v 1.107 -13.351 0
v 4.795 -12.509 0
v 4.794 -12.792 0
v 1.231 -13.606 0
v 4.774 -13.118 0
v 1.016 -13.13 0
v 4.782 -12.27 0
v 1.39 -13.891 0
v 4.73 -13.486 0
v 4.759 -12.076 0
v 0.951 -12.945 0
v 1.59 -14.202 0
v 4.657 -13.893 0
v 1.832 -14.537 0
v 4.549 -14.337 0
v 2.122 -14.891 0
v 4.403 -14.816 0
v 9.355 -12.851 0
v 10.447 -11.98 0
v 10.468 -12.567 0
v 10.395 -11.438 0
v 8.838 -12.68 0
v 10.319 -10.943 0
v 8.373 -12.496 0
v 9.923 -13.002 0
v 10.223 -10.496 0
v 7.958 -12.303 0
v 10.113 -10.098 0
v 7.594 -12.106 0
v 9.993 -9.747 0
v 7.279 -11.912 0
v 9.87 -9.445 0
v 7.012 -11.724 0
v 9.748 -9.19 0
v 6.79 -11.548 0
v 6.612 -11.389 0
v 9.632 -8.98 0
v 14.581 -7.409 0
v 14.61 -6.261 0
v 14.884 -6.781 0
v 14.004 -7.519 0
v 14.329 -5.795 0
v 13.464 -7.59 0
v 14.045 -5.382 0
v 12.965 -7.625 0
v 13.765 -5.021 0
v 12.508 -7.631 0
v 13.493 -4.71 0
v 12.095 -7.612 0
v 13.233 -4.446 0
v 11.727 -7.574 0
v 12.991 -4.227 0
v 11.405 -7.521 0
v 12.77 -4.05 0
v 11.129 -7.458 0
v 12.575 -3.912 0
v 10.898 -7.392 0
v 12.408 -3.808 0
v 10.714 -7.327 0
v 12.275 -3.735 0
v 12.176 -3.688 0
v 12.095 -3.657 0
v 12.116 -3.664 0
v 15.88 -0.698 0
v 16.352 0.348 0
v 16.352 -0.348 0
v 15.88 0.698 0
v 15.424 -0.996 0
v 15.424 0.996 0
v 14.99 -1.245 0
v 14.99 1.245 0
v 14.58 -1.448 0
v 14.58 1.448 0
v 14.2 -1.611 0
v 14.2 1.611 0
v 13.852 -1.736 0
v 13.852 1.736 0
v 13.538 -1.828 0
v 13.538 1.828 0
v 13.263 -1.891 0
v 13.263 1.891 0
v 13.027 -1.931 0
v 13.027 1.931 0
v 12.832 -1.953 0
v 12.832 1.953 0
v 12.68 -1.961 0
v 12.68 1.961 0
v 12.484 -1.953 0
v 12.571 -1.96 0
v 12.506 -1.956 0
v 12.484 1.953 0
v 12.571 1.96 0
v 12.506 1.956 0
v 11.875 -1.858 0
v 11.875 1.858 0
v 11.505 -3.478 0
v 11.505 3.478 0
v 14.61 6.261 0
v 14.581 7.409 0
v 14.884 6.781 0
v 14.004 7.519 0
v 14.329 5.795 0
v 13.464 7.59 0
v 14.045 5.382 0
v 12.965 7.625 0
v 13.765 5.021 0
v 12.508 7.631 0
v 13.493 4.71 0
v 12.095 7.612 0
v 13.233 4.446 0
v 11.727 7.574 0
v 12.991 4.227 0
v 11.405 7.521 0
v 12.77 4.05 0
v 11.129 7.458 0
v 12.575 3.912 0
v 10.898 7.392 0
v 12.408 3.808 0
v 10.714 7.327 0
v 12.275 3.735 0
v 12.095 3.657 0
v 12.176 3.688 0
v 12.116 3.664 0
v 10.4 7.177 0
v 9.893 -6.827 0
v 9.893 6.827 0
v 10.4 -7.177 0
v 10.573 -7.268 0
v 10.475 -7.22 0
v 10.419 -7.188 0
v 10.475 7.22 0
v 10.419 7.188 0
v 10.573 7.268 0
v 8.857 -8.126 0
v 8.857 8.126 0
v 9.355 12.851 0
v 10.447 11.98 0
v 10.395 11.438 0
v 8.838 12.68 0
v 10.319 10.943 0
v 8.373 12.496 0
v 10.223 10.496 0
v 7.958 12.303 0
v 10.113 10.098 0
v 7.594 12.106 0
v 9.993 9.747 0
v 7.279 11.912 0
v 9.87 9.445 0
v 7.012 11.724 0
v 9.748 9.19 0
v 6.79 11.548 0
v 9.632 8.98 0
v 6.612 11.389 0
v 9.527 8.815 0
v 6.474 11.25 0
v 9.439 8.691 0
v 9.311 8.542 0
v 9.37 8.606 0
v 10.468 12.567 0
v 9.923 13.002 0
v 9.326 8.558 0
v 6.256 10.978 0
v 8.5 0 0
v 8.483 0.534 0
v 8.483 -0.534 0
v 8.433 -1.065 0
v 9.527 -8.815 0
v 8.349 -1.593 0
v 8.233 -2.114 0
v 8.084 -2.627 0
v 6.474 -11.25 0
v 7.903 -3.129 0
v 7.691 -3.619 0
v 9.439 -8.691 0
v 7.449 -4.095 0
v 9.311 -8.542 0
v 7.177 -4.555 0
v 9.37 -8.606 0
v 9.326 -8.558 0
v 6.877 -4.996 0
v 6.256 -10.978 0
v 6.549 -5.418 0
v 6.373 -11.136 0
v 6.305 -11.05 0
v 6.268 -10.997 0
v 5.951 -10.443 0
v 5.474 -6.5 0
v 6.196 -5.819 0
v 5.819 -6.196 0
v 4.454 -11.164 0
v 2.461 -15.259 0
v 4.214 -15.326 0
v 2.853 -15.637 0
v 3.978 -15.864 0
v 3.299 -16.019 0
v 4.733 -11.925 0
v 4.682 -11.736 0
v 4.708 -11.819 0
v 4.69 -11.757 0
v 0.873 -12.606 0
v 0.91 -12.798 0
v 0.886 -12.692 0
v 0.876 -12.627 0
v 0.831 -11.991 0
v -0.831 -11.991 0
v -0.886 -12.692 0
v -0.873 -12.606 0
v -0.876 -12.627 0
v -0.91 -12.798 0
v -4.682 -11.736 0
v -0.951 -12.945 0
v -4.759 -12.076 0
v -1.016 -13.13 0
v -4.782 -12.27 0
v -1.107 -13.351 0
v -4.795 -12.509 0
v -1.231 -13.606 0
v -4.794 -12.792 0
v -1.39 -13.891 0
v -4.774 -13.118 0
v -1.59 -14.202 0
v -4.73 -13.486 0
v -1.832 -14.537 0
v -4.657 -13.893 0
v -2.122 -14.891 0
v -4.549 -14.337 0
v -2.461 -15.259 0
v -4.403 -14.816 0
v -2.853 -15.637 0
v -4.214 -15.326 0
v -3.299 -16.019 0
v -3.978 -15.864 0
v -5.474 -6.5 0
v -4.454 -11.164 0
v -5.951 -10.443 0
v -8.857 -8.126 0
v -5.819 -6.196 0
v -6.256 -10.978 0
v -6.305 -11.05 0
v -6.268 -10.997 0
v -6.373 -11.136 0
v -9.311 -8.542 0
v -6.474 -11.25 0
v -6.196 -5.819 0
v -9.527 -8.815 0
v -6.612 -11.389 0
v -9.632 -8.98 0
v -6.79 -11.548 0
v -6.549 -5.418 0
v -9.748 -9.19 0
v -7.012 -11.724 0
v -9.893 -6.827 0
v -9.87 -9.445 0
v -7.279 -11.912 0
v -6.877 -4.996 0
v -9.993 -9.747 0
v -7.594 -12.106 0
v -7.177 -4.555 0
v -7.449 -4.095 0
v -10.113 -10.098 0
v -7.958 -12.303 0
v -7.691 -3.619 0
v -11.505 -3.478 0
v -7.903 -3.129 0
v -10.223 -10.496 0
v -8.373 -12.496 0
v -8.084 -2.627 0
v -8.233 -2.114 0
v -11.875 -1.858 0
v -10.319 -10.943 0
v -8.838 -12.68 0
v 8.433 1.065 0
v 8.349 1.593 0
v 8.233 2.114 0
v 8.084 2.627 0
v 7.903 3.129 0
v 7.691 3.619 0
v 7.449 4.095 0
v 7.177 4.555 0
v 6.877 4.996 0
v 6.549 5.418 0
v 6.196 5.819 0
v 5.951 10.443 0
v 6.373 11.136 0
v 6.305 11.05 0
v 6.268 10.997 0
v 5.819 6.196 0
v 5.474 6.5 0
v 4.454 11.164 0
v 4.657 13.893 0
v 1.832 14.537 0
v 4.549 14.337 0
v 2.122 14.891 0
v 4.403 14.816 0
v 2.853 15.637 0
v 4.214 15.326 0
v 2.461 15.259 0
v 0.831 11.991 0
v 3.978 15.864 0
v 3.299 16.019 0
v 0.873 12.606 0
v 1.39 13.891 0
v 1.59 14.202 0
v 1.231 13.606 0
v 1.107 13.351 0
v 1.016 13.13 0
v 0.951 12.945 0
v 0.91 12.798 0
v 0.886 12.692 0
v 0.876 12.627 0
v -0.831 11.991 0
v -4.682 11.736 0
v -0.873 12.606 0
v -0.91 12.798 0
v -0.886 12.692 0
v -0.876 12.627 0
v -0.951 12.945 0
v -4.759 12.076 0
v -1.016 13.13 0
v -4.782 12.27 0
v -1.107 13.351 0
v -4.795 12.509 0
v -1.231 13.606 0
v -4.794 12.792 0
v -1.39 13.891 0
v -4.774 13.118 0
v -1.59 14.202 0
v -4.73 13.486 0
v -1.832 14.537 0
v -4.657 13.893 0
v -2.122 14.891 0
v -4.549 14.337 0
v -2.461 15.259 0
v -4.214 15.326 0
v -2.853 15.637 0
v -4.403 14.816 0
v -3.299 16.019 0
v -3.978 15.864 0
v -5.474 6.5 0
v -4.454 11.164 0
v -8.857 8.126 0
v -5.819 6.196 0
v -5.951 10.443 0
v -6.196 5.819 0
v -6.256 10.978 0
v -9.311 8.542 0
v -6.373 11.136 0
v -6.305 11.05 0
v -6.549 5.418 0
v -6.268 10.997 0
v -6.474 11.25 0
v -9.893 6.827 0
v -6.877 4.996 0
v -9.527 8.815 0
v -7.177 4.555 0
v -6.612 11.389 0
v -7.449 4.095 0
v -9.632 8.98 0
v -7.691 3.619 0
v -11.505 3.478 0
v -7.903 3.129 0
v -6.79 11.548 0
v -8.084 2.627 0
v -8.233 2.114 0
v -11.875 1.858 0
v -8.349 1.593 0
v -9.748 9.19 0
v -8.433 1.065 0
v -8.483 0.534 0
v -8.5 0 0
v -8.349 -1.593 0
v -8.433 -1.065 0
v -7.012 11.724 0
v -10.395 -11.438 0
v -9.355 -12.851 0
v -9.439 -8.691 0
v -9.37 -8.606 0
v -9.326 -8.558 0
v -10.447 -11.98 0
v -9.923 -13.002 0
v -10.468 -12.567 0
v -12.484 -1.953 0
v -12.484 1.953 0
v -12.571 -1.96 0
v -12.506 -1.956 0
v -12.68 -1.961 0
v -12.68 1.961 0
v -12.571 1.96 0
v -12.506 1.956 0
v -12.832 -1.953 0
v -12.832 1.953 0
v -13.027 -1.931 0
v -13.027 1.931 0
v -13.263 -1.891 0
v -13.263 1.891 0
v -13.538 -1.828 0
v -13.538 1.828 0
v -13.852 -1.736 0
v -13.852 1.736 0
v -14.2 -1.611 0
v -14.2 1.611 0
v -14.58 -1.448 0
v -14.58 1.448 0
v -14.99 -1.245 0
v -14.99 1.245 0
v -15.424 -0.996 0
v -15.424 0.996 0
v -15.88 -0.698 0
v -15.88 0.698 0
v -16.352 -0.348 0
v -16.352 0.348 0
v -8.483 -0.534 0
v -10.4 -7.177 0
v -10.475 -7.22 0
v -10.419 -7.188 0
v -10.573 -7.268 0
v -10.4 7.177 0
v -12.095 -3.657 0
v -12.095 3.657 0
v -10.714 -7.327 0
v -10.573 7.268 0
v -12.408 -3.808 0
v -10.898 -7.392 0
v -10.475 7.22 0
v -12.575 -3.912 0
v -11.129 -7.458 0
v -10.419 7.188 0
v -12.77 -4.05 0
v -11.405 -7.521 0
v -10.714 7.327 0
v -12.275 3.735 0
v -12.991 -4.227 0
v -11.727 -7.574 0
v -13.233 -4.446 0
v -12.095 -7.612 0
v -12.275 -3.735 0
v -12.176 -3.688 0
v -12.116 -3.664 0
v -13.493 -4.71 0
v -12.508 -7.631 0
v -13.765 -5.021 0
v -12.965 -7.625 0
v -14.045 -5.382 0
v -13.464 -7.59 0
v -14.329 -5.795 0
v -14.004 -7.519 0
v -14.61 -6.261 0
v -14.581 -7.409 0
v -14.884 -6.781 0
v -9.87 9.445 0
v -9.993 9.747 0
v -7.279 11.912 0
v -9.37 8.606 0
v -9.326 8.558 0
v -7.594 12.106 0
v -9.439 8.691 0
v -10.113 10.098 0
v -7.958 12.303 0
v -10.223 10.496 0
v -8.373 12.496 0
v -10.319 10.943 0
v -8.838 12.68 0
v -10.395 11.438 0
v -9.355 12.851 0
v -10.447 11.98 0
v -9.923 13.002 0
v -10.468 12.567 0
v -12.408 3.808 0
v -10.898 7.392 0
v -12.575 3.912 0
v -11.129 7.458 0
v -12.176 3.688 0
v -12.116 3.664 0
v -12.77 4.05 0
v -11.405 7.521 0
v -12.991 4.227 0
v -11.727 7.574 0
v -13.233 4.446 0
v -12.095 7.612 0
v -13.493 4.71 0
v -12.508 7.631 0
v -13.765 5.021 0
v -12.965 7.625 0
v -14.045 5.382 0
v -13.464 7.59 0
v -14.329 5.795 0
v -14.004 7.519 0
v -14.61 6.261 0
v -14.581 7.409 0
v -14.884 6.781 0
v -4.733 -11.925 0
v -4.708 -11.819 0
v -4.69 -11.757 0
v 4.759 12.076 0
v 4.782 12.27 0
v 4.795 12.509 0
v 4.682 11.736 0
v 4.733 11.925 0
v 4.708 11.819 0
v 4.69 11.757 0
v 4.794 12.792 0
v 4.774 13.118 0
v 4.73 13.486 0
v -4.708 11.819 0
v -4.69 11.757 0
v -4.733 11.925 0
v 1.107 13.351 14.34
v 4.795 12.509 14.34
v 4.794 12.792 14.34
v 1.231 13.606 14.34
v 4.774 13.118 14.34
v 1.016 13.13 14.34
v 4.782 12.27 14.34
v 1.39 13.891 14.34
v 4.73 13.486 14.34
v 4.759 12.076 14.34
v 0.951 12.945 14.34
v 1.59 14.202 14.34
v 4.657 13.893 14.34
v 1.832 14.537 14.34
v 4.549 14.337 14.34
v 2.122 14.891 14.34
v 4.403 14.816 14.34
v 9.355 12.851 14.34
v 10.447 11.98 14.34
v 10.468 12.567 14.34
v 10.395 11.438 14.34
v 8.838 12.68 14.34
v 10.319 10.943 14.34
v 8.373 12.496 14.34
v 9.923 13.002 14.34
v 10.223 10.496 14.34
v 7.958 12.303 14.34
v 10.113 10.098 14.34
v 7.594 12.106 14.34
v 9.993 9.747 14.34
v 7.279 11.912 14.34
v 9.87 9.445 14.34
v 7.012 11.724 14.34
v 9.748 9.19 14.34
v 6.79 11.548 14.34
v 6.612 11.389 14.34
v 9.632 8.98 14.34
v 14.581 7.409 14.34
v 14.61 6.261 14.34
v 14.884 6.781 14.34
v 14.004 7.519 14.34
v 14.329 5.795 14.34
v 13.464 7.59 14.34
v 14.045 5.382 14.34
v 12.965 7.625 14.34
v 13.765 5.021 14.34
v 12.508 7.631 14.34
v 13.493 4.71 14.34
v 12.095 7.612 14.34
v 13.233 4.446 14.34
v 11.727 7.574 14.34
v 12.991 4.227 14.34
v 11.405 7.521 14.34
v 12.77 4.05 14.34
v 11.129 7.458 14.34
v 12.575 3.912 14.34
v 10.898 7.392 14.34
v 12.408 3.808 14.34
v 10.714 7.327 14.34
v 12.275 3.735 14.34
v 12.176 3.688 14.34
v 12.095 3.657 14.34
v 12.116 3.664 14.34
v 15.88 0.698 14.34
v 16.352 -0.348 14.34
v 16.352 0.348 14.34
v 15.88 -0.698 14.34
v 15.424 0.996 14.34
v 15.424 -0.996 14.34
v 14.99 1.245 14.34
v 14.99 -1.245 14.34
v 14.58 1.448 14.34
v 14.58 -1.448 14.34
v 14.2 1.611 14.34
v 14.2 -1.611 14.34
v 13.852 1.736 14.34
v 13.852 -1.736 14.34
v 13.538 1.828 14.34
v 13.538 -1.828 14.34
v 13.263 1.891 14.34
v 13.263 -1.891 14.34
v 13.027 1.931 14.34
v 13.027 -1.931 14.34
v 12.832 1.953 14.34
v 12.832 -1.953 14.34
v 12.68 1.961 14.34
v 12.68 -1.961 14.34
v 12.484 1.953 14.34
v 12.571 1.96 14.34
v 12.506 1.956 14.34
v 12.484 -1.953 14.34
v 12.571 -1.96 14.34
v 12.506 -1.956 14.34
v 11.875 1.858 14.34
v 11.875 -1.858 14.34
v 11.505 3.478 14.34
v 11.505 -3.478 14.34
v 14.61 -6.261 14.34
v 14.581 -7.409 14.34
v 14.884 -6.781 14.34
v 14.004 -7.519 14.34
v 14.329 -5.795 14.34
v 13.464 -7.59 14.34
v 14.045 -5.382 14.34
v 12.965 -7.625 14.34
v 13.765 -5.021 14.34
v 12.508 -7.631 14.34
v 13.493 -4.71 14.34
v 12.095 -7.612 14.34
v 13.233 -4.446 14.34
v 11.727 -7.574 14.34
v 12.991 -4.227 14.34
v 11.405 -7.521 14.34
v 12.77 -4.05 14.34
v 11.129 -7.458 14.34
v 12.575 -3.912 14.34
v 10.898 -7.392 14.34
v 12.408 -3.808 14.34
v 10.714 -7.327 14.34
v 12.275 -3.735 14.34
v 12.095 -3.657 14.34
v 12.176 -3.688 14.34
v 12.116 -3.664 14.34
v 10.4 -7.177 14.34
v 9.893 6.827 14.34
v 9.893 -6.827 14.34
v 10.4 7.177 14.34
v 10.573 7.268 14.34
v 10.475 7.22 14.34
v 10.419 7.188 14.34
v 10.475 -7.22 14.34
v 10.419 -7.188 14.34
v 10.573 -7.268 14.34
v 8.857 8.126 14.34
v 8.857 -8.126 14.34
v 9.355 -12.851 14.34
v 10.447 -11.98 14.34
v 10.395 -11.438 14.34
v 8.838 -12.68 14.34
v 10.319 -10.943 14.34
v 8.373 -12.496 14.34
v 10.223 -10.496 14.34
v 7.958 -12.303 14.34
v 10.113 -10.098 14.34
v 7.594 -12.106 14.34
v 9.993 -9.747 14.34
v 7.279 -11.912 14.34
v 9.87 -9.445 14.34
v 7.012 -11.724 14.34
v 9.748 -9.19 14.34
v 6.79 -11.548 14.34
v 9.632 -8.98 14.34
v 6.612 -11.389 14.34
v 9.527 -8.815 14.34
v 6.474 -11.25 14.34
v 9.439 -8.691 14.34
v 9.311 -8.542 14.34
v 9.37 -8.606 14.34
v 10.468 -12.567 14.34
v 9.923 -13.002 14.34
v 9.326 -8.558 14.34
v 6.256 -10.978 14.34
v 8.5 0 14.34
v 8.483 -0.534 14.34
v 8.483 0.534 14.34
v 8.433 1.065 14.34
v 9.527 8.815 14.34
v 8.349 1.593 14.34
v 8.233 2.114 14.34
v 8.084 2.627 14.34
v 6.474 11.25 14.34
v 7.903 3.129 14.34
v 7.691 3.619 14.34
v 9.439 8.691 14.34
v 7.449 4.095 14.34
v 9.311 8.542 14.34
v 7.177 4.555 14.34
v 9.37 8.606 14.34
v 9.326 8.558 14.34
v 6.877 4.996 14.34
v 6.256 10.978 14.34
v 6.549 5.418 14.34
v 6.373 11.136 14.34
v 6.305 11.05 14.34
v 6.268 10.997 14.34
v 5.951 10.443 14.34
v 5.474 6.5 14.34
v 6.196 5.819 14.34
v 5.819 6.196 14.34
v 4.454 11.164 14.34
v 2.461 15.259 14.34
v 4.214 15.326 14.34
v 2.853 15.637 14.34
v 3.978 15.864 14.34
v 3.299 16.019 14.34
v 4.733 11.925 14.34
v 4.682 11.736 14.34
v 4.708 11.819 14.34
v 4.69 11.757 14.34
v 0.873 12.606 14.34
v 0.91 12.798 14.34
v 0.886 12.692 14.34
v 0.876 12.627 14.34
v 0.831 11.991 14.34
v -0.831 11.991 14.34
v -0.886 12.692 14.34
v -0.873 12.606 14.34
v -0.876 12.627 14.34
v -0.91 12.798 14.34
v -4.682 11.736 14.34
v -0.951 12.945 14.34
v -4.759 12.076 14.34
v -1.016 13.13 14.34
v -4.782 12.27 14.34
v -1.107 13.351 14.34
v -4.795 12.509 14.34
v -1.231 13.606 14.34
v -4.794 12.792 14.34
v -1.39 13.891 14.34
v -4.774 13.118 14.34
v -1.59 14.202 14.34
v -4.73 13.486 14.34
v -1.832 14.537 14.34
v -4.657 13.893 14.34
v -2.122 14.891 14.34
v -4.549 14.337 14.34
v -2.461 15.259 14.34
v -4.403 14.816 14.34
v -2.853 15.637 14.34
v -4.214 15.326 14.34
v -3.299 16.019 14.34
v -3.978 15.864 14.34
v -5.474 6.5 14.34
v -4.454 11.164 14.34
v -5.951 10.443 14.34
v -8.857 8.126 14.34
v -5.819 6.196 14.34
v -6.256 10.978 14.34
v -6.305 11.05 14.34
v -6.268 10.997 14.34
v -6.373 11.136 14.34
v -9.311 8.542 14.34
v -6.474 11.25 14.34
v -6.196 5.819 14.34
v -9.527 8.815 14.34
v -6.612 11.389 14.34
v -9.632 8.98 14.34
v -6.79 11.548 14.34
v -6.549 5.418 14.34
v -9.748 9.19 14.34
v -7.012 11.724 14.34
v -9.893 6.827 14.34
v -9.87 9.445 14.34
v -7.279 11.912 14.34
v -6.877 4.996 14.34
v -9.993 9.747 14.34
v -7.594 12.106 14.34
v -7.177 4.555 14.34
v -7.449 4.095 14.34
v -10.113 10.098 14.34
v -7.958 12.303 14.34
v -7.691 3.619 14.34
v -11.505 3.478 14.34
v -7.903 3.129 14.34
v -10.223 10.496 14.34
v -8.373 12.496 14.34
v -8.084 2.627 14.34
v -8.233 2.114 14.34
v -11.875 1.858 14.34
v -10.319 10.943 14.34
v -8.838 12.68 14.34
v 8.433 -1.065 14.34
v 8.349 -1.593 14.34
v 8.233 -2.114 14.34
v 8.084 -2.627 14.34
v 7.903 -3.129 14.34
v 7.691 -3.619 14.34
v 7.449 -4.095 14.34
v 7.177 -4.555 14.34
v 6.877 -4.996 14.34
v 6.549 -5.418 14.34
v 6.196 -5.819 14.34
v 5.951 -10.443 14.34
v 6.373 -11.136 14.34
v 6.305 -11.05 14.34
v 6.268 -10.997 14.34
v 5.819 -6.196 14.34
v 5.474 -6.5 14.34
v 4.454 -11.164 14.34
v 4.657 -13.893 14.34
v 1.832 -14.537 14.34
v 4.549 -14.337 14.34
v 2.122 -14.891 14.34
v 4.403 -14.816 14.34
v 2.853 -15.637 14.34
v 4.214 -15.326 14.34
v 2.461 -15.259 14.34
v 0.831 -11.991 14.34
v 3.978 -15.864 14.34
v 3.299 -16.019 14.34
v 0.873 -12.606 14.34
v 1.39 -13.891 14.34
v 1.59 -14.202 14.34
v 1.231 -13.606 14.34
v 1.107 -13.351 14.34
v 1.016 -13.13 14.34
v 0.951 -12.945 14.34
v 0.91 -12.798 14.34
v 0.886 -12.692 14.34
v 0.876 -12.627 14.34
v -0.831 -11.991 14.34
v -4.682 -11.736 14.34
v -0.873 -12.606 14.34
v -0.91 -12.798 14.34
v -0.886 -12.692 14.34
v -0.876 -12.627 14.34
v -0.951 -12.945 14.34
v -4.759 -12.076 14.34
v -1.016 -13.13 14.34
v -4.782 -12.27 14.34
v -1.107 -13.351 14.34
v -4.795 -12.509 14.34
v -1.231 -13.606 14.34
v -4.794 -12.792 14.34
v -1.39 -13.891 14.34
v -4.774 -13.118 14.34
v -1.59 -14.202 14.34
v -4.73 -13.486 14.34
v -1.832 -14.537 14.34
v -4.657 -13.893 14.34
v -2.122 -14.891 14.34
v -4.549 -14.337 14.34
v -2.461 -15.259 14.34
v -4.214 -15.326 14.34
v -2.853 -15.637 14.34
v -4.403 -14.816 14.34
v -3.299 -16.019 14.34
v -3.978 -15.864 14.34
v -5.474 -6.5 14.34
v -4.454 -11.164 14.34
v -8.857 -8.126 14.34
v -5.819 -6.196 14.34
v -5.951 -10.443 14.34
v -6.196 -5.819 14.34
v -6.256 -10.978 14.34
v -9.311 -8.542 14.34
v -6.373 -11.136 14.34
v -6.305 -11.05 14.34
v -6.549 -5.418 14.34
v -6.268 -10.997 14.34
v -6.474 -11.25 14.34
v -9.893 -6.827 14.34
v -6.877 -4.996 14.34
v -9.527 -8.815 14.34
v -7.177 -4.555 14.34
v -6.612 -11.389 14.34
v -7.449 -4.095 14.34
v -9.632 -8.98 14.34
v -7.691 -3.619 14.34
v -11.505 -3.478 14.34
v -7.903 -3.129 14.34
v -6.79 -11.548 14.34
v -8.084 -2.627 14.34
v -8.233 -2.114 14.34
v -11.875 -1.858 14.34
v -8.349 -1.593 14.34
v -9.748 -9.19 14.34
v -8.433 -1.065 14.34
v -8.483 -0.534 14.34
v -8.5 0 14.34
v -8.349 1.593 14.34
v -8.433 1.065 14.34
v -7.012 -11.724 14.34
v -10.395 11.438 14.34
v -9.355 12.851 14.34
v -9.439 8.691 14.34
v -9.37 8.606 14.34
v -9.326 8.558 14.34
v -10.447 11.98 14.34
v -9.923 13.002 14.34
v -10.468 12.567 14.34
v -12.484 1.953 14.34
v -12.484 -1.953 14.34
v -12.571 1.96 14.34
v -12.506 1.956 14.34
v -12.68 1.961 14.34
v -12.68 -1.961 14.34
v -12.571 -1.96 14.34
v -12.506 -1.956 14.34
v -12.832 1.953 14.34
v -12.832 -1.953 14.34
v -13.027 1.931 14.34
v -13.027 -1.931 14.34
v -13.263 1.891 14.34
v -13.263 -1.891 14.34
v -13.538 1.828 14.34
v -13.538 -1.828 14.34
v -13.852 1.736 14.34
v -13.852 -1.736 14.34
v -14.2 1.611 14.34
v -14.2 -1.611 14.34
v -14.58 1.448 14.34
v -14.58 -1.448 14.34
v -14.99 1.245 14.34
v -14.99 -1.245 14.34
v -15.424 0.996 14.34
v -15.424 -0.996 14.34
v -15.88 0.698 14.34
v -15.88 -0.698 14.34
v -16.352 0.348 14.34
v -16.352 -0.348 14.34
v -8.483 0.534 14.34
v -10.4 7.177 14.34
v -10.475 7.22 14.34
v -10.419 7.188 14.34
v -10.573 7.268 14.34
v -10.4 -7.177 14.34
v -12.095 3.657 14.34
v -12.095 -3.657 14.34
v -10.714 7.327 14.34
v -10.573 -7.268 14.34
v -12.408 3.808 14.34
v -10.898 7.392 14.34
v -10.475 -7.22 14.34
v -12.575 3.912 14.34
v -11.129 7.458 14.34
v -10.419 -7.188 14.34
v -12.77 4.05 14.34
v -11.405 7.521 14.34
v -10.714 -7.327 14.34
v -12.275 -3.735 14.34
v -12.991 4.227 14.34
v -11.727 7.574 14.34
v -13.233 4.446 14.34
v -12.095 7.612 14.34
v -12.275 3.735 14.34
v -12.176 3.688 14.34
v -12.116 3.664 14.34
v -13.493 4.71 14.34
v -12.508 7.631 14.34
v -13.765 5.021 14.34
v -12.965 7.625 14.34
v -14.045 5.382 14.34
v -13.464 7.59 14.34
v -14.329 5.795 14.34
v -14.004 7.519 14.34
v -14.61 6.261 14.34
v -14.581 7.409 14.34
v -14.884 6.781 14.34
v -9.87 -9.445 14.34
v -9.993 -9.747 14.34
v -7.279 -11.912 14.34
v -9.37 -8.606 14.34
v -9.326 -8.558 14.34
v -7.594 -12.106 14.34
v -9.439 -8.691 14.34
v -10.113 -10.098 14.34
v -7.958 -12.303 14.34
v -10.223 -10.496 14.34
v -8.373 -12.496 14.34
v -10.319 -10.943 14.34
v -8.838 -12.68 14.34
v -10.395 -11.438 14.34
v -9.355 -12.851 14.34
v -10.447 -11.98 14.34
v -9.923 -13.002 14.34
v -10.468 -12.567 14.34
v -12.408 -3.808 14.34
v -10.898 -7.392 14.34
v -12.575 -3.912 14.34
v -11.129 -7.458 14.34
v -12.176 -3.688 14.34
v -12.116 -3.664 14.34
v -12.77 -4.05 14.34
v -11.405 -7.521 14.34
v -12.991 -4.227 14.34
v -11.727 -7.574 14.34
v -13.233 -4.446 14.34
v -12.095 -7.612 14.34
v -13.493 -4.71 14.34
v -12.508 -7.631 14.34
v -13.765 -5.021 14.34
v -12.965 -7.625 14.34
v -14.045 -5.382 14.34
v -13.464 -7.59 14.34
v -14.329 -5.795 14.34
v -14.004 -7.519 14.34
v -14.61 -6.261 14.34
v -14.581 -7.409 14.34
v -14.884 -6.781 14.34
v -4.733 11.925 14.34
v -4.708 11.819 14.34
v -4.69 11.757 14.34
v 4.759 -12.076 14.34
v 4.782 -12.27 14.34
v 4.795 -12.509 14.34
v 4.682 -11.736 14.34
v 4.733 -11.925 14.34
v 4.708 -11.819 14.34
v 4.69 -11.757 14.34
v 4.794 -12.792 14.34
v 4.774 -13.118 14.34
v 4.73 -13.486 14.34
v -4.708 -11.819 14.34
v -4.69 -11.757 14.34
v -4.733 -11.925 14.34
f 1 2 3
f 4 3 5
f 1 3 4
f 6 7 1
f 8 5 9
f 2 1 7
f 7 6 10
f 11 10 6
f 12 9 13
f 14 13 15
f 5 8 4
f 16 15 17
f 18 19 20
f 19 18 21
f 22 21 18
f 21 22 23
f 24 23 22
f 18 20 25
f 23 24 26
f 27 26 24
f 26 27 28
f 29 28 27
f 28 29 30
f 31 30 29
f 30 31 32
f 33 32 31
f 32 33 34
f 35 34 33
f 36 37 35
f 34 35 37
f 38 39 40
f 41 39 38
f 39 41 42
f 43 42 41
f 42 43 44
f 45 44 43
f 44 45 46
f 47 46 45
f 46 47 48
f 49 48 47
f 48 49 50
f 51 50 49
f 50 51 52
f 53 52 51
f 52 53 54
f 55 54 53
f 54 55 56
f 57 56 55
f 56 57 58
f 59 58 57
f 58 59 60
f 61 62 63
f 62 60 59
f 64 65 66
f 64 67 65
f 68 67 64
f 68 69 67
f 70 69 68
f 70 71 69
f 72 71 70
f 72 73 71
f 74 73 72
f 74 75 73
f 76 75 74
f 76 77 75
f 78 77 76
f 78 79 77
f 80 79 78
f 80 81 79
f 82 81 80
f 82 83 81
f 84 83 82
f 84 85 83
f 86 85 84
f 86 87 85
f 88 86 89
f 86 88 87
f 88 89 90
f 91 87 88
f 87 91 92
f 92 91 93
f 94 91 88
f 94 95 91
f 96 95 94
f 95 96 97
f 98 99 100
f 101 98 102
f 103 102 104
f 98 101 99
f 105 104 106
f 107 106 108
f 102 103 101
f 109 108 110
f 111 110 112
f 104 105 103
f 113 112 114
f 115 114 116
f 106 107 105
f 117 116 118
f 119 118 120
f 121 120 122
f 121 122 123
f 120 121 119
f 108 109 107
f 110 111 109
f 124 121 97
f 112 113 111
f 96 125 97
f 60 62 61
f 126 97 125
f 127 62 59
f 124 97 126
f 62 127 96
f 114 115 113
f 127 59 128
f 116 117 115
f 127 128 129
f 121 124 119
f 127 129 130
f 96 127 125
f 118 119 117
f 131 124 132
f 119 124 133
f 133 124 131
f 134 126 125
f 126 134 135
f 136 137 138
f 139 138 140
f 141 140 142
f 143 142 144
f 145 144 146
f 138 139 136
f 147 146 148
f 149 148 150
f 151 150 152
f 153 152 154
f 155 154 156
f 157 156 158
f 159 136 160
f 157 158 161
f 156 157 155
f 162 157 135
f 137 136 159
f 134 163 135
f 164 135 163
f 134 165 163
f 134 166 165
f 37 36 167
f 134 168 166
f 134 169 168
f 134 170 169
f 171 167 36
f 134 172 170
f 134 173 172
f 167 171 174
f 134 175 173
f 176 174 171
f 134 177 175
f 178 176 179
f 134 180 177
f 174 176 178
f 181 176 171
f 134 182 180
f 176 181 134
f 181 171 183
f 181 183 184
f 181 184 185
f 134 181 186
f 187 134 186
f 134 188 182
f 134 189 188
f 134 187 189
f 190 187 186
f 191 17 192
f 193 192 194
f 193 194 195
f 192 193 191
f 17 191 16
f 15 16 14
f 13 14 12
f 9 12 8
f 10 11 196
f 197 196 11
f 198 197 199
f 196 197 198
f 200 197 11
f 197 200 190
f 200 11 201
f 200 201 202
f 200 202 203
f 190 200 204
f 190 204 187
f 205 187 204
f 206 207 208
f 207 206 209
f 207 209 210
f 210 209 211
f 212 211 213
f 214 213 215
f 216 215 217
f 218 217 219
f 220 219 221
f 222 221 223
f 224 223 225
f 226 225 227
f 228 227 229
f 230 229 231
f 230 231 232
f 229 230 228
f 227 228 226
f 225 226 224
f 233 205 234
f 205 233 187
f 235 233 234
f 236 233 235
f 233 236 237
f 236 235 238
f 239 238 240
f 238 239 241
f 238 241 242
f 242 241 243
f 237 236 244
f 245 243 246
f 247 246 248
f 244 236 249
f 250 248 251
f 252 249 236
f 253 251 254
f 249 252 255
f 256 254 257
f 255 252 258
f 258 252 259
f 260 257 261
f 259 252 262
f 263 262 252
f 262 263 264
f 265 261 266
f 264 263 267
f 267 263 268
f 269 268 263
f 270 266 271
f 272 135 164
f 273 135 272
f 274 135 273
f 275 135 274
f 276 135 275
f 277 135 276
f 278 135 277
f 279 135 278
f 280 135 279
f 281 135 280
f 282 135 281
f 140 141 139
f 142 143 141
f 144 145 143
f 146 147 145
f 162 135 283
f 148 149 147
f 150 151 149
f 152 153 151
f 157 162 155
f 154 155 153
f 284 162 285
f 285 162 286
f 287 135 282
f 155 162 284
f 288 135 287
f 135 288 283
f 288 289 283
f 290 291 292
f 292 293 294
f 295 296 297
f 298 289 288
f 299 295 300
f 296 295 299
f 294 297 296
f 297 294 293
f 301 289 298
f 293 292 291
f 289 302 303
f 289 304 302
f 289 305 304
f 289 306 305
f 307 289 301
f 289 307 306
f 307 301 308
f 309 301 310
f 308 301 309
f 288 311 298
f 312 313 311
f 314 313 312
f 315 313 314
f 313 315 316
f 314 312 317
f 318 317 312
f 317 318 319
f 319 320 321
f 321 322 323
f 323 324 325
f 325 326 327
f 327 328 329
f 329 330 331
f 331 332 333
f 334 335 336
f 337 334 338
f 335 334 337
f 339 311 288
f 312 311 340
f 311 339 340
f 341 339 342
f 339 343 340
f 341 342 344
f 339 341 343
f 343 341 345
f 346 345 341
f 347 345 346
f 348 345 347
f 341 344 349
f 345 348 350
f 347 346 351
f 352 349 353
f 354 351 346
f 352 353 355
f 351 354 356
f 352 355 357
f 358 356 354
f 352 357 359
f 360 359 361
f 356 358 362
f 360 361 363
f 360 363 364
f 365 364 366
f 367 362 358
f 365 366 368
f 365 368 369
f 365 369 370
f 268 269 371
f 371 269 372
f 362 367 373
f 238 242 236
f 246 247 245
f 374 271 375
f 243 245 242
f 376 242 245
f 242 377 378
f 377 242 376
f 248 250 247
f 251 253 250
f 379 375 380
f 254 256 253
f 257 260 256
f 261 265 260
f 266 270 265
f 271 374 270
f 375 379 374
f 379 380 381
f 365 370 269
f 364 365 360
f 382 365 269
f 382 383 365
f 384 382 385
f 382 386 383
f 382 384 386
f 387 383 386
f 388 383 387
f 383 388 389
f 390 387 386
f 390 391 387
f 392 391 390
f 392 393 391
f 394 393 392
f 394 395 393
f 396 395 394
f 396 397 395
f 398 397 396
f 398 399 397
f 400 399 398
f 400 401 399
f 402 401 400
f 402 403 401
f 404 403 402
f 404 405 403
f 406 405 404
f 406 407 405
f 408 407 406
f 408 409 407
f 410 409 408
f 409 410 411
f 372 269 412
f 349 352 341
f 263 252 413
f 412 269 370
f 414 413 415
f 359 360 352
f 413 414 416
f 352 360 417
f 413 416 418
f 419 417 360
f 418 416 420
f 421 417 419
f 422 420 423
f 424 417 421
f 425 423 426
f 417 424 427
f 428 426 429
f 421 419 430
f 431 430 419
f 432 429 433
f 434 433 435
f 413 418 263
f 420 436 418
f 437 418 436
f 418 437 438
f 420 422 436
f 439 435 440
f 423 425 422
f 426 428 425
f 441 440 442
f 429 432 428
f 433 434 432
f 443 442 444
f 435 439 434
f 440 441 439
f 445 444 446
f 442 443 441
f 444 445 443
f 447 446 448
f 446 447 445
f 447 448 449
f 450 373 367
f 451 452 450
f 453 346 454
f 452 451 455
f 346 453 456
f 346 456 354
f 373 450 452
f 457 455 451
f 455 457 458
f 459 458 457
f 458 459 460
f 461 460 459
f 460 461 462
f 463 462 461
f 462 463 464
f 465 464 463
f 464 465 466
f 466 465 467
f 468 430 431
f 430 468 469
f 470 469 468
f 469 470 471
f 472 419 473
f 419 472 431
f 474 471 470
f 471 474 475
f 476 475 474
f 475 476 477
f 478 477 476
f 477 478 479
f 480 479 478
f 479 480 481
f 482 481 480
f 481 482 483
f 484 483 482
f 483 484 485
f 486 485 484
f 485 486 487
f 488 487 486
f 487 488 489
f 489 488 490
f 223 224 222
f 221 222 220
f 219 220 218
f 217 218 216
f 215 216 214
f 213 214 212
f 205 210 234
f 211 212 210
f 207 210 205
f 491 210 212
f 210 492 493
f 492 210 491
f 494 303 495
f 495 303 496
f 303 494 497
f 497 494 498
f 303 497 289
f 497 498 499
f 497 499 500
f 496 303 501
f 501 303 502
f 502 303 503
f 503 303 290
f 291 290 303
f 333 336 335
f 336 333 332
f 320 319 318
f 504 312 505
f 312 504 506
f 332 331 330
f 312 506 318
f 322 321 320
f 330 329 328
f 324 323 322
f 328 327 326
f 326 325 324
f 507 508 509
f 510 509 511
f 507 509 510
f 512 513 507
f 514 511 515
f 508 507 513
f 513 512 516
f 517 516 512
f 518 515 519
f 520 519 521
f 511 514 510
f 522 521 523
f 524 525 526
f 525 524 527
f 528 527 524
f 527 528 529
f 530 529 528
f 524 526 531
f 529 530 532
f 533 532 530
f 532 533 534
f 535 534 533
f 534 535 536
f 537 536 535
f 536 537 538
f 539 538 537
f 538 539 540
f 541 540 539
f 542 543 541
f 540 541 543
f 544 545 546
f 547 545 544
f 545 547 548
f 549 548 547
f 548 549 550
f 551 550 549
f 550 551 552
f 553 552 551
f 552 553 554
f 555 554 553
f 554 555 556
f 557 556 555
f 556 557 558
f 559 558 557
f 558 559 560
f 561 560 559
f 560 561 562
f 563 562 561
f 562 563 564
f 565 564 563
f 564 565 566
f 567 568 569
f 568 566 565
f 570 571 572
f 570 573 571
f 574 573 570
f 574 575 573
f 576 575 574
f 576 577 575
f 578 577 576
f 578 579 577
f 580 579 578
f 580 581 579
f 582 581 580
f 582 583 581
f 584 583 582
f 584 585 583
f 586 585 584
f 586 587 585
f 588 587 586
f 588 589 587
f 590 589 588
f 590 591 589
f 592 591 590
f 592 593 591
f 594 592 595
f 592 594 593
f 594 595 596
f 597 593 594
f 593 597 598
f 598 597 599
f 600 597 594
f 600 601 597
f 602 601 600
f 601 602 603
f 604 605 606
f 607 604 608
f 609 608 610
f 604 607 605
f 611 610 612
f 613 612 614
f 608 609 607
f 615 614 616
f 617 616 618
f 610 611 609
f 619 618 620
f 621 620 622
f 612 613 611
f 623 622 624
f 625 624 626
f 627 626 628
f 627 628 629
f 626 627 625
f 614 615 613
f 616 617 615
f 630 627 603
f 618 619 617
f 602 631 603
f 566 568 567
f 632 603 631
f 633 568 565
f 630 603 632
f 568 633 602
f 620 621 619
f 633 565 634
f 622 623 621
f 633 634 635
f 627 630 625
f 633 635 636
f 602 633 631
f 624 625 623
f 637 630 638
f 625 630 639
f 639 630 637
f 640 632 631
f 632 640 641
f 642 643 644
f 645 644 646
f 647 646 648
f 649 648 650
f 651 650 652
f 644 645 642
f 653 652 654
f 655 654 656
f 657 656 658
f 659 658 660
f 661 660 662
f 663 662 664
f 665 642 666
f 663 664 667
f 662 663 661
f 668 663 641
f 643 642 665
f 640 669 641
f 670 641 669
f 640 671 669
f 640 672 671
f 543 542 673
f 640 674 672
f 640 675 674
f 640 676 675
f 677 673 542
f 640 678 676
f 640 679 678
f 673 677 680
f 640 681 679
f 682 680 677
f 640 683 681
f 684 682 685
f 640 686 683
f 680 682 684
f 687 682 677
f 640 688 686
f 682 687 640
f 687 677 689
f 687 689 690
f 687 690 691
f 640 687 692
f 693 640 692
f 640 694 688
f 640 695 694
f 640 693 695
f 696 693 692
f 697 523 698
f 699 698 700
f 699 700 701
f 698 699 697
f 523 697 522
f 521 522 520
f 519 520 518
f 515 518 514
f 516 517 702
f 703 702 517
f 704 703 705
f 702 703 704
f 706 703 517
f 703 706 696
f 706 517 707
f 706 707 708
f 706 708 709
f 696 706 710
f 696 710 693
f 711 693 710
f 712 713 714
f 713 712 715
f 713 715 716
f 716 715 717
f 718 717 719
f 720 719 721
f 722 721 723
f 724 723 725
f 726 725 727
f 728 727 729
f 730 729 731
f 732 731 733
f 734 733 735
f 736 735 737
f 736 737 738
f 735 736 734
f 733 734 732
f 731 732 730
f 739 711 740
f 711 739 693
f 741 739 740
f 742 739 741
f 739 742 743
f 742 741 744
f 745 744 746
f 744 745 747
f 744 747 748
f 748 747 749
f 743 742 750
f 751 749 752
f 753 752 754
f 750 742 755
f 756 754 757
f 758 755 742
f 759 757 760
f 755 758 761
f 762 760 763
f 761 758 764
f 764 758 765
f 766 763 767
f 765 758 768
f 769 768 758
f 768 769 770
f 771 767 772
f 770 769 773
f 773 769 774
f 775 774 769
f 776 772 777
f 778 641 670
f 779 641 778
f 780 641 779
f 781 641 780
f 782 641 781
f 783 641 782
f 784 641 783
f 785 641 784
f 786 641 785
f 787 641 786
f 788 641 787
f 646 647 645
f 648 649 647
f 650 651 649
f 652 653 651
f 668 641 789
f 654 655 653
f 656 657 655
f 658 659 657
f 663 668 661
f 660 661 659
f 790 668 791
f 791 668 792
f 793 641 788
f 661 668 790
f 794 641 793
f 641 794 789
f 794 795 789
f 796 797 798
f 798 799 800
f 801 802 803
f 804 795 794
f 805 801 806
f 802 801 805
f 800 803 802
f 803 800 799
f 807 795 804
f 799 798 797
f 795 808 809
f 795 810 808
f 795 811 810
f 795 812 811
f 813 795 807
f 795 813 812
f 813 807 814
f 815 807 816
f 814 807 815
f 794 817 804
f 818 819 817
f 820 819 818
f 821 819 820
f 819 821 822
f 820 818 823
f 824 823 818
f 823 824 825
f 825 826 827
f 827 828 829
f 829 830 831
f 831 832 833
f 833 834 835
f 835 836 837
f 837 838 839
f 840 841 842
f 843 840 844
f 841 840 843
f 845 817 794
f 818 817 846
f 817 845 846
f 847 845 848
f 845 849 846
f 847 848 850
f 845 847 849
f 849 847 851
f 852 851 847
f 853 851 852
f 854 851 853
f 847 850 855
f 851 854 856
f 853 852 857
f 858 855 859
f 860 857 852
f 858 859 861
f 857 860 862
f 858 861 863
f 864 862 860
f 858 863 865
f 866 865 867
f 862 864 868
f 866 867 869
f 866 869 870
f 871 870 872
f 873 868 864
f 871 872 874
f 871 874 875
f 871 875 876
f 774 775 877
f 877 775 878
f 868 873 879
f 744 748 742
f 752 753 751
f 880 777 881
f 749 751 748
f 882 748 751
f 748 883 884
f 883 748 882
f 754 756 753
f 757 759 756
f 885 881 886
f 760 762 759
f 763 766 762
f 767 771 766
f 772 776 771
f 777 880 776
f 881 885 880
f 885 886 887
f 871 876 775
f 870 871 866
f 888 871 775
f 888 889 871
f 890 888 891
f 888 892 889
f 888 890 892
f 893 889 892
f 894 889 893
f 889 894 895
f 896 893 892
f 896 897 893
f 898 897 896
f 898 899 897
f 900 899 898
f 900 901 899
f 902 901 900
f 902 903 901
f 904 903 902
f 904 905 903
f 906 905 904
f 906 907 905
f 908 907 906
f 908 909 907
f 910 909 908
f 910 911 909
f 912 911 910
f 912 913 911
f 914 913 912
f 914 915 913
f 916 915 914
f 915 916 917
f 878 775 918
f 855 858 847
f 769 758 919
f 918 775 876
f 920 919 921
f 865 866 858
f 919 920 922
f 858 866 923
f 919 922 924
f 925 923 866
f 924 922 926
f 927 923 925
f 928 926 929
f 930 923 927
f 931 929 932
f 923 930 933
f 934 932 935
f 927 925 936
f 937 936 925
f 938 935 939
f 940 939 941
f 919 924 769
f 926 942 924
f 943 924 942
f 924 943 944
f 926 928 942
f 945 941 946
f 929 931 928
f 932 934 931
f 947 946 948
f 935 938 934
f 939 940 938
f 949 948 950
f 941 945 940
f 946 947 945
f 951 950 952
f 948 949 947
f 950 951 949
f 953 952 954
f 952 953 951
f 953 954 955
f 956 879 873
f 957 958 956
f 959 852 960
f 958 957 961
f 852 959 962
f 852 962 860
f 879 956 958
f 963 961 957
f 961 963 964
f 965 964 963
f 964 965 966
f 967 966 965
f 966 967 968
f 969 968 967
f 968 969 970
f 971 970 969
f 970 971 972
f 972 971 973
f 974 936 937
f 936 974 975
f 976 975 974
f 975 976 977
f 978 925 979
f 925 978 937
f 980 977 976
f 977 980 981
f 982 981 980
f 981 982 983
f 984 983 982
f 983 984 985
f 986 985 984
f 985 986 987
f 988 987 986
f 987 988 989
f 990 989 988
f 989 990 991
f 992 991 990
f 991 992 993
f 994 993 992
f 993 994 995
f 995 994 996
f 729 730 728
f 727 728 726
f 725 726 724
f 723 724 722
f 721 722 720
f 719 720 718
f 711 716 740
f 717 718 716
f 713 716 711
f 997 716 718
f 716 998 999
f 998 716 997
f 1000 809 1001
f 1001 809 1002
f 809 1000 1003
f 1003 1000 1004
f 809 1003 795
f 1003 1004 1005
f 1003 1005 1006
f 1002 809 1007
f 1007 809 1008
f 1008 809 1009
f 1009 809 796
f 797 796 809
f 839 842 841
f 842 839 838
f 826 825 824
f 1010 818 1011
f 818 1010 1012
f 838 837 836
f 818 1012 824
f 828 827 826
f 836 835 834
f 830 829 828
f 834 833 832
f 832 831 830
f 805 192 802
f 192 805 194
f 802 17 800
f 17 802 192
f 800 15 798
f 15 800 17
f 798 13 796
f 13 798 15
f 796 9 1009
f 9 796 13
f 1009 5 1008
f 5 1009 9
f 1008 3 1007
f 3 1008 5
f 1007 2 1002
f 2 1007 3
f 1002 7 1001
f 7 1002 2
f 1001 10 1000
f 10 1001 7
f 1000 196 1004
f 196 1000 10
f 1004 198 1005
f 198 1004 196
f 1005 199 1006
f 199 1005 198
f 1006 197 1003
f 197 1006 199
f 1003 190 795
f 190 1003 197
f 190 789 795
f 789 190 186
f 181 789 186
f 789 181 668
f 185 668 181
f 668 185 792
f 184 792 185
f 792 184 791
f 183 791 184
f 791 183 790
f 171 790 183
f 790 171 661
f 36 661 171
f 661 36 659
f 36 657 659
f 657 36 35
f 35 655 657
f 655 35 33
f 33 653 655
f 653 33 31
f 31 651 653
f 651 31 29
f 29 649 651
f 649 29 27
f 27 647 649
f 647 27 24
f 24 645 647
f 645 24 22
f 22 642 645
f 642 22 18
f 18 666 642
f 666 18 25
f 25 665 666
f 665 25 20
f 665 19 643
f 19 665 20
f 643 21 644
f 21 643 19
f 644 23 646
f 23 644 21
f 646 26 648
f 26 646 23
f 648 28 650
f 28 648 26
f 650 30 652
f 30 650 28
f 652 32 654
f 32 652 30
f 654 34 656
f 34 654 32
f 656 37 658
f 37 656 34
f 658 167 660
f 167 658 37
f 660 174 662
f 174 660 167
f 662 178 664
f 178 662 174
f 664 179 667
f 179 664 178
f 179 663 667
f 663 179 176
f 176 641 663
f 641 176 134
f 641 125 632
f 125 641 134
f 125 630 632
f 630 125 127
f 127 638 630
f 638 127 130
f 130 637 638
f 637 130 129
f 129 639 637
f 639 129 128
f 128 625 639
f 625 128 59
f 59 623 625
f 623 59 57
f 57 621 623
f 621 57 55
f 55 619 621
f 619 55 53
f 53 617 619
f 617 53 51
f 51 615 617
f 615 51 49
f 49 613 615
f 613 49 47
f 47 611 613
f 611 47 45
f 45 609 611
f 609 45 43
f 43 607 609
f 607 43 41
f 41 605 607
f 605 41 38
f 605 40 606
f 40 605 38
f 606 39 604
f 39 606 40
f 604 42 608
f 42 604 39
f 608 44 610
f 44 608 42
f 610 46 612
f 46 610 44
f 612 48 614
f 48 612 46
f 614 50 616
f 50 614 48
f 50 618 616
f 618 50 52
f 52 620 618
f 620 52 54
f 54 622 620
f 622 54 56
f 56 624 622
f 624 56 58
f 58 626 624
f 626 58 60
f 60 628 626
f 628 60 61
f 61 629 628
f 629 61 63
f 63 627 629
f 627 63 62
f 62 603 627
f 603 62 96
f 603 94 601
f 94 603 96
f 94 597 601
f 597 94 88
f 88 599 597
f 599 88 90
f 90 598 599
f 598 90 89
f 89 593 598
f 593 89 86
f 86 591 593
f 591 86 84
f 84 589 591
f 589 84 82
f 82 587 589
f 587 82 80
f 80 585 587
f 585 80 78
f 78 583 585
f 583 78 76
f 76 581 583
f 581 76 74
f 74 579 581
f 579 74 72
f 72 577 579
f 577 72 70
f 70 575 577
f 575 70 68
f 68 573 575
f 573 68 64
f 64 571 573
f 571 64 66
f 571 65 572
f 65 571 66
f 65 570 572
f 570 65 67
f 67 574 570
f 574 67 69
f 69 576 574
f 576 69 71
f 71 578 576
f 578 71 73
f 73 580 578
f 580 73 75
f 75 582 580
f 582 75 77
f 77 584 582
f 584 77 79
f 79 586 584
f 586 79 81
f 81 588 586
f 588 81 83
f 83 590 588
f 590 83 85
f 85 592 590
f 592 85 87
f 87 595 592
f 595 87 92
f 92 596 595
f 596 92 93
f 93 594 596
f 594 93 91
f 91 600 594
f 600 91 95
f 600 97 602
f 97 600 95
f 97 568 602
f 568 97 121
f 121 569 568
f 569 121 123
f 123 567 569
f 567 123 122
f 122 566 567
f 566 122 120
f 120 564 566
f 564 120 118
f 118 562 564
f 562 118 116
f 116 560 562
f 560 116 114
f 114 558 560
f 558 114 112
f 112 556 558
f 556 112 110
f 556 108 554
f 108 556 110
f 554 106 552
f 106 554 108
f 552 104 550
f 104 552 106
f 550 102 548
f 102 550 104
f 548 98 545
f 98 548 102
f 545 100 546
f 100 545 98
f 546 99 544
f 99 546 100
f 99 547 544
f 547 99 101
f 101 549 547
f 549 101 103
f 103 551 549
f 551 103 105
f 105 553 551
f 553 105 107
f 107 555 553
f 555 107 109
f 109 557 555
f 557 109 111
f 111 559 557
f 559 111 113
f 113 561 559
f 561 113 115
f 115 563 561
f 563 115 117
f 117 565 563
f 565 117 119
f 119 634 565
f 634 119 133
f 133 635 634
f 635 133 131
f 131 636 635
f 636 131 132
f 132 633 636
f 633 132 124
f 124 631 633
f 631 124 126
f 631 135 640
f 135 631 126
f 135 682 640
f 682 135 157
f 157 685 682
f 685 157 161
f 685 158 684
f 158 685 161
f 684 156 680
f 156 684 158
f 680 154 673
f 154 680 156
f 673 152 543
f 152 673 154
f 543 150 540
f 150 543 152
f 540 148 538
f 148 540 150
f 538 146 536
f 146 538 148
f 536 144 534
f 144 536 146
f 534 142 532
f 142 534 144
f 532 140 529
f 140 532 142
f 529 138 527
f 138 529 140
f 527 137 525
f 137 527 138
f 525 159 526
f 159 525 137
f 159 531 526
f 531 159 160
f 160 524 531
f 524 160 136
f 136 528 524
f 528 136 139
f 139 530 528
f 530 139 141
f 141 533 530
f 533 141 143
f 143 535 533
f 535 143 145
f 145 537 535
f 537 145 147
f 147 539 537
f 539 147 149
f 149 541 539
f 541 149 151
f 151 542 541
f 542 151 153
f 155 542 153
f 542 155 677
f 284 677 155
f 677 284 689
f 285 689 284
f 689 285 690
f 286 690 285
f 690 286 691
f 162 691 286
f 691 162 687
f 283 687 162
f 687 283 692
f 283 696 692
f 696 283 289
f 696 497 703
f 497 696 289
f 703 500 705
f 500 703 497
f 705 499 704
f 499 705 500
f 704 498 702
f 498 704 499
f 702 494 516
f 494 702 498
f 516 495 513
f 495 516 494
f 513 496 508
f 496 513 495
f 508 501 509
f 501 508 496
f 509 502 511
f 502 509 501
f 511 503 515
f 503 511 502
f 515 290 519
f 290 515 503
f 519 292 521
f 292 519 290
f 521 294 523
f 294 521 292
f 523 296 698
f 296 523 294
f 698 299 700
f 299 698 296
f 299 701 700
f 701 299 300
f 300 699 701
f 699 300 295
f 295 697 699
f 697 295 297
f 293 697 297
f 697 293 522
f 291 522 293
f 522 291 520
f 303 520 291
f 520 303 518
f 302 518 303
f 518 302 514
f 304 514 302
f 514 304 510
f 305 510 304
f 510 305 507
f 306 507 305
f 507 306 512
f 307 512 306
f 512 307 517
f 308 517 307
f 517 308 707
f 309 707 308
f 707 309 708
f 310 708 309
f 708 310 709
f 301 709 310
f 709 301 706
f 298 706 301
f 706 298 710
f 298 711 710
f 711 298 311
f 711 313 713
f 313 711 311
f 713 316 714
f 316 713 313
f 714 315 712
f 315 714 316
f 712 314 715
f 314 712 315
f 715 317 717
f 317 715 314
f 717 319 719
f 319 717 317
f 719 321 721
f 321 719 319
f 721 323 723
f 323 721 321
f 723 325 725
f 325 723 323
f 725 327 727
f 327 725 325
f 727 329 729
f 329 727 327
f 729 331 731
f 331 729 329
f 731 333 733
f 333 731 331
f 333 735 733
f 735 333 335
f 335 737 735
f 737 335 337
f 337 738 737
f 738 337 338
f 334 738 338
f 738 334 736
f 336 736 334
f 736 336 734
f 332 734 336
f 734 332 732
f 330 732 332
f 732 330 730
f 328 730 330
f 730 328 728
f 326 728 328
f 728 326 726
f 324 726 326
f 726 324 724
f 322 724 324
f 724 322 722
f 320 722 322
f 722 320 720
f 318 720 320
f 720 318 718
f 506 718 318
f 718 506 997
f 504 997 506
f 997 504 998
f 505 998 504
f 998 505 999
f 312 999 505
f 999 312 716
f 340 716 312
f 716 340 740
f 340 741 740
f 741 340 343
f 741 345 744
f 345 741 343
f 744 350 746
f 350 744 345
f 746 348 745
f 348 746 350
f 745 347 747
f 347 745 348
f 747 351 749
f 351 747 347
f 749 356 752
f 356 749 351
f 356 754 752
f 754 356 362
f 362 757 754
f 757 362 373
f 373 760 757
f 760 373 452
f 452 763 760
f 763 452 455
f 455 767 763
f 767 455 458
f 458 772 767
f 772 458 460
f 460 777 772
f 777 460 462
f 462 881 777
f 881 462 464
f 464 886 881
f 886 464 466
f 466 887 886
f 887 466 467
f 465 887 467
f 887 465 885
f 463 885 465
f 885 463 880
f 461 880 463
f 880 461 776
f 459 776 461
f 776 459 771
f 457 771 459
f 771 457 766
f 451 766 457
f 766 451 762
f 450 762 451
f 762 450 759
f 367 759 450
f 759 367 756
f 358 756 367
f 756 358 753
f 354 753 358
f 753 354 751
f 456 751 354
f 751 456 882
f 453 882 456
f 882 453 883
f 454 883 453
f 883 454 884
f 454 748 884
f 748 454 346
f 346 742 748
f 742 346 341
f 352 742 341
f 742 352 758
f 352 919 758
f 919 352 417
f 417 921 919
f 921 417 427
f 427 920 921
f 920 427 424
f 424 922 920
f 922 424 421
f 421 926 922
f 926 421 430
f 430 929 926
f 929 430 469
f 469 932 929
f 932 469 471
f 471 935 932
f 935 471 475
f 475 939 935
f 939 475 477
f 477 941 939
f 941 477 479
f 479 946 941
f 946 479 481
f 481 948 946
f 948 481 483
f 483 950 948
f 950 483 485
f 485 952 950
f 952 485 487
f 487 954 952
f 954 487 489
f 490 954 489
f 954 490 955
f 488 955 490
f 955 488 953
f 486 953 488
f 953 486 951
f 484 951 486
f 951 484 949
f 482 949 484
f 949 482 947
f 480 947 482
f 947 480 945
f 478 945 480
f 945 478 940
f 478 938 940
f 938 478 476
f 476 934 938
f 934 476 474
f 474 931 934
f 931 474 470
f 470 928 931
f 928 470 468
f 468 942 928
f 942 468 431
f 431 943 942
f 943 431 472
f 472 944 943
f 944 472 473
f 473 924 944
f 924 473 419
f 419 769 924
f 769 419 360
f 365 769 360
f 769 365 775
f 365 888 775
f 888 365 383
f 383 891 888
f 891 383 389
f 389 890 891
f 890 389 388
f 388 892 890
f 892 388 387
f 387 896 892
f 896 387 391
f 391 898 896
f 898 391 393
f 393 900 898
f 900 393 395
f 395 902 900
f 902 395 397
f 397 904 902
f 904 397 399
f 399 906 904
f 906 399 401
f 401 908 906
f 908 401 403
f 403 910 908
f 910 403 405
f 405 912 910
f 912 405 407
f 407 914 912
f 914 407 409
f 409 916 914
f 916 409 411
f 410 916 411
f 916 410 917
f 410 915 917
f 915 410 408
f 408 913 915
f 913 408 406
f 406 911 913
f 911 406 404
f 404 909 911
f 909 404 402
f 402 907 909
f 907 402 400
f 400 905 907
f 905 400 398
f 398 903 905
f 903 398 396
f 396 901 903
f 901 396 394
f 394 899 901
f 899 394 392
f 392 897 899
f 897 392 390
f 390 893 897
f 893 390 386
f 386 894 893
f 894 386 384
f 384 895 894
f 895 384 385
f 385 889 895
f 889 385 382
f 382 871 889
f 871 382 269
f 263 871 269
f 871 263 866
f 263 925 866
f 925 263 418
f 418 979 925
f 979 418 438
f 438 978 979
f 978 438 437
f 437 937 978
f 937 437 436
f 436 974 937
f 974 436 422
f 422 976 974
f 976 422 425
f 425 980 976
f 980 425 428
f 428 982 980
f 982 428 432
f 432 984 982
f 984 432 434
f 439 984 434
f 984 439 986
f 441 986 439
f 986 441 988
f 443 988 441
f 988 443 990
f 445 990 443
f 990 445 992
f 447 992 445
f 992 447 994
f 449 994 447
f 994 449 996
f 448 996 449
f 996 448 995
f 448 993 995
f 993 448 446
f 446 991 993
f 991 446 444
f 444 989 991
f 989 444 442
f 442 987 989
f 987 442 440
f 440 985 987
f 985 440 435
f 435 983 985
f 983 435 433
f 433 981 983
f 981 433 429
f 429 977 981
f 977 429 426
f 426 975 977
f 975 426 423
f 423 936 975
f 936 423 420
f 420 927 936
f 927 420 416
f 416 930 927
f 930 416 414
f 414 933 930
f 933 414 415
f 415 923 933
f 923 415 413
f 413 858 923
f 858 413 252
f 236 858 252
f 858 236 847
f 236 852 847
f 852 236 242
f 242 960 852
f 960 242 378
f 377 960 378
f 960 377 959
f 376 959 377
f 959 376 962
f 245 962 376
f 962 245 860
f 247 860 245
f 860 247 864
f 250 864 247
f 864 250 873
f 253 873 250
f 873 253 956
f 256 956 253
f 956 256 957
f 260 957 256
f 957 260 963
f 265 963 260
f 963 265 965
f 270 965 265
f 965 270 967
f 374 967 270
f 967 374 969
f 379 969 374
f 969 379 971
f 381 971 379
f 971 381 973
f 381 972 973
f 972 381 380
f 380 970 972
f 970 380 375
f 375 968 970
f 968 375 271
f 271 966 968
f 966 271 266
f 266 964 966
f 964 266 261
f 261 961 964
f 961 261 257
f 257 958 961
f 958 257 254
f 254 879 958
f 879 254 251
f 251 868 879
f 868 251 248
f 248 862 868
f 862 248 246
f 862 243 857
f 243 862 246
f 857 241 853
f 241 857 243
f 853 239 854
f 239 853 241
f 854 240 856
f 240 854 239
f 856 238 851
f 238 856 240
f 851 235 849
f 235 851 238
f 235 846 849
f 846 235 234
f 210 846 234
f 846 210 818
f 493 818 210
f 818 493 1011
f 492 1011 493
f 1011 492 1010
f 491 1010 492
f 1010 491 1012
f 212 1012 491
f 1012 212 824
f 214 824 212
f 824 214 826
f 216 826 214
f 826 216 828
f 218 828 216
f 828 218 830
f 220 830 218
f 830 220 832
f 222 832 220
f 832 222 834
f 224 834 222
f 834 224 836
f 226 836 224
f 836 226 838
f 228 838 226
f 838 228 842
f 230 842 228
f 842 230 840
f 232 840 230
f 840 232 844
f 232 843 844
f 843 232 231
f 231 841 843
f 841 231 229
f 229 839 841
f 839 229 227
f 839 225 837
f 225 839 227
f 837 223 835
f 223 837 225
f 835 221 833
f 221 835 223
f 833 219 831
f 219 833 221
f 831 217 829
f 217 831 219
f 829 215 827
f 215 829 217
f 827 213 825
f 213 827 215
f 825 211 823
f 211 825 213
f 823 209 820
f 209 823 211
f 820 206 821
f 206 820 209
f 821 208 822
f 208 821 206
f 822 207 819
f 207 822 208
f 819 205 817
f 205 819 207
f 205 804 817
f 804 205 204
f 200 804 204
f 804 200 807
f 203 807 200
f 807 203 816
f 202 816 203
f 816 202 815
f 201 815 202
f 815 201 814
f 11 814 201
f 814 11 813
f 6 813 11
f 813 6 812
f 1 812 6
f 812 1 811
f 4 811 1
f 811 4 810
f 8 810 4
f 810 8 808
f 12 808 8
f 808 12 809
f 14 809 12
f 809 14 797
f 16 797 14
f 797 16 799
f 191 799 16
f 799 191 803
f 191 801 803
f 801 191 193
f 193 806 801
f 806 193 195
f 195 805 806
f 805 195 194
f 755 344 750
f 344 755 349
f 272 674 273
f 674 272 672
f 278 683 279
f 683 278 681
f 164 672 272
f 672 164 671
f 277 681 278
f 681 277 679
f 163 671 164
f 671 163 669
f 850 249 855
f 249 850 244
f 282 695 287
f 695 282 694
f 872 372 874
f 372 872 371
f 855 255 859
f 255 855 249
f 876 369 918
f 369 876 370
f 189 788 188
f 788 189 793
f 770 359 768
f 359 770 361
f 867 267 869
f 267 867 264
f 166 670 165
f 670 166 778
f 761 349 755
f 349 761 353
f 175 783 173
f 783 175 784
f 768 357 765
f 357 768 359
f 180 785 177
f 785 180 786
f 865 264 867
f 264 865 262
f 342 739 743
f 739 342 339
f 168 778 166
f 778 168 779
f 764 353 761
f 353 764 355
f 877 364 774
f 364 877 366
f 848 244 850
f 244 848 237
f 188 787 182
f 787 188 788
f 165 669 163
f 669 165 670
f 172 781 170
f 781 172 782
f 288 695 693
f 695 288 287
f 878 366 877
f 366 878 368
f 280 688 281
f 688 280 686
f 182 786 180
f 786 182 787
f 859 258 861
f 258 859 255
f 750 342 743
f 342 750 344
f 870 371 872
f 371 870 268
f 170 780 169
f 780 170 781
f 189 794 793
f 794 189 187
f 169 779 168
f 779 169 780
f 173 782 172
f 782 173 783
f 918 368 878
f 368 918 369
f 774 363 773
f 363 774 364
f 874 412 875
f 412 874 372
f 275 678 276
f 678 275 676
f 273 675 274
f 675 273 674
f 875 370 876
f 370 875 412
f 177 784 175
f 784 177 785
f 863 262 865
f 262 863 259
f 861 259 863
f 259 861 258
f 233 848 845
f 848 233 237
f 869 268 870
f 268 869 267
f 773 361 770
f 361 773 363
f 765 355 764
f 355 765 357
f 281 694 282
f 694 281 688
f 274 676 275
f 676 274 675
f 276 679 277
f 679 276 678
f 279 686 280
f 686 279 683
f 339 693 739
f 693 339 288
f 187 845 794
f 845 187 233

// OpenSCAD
// gear for juice press
// 14 teeth
// 32.70mm OD
// 21.7 ID, 
// 17.00mm diameter inner circle squared off ID key with 13.00mm width
// 5.25mm tooth height
// 14.34  height

$fn = 100;
eps = 0.1;
use <MCAD/involute_gears.scad>
module mygear(){
        gear (
	circular_pitch=368,
	rim_thickness = 14.34,
	rim_width = 23.7,
	bore_diameter=17.00,
	hub_thickness = 14.34,
	circles=0,
	involute_facets=14,
	number_of_teeth=14
	);
}


union(){
  mygear();
  squareouts();
}

module squareouts(){
difference(){
translate([0,0,14.34/2])cylinder(r=17.00/2,h=14.34,center=true);
//translate([0,0,14.34/2.5])cube ([32.70,32.70,14.34],center=true);
//intersection(){
translate([0,0,14.34/2])cube ([17.00,13.00,14.34+eps],center=true);
  }
}
